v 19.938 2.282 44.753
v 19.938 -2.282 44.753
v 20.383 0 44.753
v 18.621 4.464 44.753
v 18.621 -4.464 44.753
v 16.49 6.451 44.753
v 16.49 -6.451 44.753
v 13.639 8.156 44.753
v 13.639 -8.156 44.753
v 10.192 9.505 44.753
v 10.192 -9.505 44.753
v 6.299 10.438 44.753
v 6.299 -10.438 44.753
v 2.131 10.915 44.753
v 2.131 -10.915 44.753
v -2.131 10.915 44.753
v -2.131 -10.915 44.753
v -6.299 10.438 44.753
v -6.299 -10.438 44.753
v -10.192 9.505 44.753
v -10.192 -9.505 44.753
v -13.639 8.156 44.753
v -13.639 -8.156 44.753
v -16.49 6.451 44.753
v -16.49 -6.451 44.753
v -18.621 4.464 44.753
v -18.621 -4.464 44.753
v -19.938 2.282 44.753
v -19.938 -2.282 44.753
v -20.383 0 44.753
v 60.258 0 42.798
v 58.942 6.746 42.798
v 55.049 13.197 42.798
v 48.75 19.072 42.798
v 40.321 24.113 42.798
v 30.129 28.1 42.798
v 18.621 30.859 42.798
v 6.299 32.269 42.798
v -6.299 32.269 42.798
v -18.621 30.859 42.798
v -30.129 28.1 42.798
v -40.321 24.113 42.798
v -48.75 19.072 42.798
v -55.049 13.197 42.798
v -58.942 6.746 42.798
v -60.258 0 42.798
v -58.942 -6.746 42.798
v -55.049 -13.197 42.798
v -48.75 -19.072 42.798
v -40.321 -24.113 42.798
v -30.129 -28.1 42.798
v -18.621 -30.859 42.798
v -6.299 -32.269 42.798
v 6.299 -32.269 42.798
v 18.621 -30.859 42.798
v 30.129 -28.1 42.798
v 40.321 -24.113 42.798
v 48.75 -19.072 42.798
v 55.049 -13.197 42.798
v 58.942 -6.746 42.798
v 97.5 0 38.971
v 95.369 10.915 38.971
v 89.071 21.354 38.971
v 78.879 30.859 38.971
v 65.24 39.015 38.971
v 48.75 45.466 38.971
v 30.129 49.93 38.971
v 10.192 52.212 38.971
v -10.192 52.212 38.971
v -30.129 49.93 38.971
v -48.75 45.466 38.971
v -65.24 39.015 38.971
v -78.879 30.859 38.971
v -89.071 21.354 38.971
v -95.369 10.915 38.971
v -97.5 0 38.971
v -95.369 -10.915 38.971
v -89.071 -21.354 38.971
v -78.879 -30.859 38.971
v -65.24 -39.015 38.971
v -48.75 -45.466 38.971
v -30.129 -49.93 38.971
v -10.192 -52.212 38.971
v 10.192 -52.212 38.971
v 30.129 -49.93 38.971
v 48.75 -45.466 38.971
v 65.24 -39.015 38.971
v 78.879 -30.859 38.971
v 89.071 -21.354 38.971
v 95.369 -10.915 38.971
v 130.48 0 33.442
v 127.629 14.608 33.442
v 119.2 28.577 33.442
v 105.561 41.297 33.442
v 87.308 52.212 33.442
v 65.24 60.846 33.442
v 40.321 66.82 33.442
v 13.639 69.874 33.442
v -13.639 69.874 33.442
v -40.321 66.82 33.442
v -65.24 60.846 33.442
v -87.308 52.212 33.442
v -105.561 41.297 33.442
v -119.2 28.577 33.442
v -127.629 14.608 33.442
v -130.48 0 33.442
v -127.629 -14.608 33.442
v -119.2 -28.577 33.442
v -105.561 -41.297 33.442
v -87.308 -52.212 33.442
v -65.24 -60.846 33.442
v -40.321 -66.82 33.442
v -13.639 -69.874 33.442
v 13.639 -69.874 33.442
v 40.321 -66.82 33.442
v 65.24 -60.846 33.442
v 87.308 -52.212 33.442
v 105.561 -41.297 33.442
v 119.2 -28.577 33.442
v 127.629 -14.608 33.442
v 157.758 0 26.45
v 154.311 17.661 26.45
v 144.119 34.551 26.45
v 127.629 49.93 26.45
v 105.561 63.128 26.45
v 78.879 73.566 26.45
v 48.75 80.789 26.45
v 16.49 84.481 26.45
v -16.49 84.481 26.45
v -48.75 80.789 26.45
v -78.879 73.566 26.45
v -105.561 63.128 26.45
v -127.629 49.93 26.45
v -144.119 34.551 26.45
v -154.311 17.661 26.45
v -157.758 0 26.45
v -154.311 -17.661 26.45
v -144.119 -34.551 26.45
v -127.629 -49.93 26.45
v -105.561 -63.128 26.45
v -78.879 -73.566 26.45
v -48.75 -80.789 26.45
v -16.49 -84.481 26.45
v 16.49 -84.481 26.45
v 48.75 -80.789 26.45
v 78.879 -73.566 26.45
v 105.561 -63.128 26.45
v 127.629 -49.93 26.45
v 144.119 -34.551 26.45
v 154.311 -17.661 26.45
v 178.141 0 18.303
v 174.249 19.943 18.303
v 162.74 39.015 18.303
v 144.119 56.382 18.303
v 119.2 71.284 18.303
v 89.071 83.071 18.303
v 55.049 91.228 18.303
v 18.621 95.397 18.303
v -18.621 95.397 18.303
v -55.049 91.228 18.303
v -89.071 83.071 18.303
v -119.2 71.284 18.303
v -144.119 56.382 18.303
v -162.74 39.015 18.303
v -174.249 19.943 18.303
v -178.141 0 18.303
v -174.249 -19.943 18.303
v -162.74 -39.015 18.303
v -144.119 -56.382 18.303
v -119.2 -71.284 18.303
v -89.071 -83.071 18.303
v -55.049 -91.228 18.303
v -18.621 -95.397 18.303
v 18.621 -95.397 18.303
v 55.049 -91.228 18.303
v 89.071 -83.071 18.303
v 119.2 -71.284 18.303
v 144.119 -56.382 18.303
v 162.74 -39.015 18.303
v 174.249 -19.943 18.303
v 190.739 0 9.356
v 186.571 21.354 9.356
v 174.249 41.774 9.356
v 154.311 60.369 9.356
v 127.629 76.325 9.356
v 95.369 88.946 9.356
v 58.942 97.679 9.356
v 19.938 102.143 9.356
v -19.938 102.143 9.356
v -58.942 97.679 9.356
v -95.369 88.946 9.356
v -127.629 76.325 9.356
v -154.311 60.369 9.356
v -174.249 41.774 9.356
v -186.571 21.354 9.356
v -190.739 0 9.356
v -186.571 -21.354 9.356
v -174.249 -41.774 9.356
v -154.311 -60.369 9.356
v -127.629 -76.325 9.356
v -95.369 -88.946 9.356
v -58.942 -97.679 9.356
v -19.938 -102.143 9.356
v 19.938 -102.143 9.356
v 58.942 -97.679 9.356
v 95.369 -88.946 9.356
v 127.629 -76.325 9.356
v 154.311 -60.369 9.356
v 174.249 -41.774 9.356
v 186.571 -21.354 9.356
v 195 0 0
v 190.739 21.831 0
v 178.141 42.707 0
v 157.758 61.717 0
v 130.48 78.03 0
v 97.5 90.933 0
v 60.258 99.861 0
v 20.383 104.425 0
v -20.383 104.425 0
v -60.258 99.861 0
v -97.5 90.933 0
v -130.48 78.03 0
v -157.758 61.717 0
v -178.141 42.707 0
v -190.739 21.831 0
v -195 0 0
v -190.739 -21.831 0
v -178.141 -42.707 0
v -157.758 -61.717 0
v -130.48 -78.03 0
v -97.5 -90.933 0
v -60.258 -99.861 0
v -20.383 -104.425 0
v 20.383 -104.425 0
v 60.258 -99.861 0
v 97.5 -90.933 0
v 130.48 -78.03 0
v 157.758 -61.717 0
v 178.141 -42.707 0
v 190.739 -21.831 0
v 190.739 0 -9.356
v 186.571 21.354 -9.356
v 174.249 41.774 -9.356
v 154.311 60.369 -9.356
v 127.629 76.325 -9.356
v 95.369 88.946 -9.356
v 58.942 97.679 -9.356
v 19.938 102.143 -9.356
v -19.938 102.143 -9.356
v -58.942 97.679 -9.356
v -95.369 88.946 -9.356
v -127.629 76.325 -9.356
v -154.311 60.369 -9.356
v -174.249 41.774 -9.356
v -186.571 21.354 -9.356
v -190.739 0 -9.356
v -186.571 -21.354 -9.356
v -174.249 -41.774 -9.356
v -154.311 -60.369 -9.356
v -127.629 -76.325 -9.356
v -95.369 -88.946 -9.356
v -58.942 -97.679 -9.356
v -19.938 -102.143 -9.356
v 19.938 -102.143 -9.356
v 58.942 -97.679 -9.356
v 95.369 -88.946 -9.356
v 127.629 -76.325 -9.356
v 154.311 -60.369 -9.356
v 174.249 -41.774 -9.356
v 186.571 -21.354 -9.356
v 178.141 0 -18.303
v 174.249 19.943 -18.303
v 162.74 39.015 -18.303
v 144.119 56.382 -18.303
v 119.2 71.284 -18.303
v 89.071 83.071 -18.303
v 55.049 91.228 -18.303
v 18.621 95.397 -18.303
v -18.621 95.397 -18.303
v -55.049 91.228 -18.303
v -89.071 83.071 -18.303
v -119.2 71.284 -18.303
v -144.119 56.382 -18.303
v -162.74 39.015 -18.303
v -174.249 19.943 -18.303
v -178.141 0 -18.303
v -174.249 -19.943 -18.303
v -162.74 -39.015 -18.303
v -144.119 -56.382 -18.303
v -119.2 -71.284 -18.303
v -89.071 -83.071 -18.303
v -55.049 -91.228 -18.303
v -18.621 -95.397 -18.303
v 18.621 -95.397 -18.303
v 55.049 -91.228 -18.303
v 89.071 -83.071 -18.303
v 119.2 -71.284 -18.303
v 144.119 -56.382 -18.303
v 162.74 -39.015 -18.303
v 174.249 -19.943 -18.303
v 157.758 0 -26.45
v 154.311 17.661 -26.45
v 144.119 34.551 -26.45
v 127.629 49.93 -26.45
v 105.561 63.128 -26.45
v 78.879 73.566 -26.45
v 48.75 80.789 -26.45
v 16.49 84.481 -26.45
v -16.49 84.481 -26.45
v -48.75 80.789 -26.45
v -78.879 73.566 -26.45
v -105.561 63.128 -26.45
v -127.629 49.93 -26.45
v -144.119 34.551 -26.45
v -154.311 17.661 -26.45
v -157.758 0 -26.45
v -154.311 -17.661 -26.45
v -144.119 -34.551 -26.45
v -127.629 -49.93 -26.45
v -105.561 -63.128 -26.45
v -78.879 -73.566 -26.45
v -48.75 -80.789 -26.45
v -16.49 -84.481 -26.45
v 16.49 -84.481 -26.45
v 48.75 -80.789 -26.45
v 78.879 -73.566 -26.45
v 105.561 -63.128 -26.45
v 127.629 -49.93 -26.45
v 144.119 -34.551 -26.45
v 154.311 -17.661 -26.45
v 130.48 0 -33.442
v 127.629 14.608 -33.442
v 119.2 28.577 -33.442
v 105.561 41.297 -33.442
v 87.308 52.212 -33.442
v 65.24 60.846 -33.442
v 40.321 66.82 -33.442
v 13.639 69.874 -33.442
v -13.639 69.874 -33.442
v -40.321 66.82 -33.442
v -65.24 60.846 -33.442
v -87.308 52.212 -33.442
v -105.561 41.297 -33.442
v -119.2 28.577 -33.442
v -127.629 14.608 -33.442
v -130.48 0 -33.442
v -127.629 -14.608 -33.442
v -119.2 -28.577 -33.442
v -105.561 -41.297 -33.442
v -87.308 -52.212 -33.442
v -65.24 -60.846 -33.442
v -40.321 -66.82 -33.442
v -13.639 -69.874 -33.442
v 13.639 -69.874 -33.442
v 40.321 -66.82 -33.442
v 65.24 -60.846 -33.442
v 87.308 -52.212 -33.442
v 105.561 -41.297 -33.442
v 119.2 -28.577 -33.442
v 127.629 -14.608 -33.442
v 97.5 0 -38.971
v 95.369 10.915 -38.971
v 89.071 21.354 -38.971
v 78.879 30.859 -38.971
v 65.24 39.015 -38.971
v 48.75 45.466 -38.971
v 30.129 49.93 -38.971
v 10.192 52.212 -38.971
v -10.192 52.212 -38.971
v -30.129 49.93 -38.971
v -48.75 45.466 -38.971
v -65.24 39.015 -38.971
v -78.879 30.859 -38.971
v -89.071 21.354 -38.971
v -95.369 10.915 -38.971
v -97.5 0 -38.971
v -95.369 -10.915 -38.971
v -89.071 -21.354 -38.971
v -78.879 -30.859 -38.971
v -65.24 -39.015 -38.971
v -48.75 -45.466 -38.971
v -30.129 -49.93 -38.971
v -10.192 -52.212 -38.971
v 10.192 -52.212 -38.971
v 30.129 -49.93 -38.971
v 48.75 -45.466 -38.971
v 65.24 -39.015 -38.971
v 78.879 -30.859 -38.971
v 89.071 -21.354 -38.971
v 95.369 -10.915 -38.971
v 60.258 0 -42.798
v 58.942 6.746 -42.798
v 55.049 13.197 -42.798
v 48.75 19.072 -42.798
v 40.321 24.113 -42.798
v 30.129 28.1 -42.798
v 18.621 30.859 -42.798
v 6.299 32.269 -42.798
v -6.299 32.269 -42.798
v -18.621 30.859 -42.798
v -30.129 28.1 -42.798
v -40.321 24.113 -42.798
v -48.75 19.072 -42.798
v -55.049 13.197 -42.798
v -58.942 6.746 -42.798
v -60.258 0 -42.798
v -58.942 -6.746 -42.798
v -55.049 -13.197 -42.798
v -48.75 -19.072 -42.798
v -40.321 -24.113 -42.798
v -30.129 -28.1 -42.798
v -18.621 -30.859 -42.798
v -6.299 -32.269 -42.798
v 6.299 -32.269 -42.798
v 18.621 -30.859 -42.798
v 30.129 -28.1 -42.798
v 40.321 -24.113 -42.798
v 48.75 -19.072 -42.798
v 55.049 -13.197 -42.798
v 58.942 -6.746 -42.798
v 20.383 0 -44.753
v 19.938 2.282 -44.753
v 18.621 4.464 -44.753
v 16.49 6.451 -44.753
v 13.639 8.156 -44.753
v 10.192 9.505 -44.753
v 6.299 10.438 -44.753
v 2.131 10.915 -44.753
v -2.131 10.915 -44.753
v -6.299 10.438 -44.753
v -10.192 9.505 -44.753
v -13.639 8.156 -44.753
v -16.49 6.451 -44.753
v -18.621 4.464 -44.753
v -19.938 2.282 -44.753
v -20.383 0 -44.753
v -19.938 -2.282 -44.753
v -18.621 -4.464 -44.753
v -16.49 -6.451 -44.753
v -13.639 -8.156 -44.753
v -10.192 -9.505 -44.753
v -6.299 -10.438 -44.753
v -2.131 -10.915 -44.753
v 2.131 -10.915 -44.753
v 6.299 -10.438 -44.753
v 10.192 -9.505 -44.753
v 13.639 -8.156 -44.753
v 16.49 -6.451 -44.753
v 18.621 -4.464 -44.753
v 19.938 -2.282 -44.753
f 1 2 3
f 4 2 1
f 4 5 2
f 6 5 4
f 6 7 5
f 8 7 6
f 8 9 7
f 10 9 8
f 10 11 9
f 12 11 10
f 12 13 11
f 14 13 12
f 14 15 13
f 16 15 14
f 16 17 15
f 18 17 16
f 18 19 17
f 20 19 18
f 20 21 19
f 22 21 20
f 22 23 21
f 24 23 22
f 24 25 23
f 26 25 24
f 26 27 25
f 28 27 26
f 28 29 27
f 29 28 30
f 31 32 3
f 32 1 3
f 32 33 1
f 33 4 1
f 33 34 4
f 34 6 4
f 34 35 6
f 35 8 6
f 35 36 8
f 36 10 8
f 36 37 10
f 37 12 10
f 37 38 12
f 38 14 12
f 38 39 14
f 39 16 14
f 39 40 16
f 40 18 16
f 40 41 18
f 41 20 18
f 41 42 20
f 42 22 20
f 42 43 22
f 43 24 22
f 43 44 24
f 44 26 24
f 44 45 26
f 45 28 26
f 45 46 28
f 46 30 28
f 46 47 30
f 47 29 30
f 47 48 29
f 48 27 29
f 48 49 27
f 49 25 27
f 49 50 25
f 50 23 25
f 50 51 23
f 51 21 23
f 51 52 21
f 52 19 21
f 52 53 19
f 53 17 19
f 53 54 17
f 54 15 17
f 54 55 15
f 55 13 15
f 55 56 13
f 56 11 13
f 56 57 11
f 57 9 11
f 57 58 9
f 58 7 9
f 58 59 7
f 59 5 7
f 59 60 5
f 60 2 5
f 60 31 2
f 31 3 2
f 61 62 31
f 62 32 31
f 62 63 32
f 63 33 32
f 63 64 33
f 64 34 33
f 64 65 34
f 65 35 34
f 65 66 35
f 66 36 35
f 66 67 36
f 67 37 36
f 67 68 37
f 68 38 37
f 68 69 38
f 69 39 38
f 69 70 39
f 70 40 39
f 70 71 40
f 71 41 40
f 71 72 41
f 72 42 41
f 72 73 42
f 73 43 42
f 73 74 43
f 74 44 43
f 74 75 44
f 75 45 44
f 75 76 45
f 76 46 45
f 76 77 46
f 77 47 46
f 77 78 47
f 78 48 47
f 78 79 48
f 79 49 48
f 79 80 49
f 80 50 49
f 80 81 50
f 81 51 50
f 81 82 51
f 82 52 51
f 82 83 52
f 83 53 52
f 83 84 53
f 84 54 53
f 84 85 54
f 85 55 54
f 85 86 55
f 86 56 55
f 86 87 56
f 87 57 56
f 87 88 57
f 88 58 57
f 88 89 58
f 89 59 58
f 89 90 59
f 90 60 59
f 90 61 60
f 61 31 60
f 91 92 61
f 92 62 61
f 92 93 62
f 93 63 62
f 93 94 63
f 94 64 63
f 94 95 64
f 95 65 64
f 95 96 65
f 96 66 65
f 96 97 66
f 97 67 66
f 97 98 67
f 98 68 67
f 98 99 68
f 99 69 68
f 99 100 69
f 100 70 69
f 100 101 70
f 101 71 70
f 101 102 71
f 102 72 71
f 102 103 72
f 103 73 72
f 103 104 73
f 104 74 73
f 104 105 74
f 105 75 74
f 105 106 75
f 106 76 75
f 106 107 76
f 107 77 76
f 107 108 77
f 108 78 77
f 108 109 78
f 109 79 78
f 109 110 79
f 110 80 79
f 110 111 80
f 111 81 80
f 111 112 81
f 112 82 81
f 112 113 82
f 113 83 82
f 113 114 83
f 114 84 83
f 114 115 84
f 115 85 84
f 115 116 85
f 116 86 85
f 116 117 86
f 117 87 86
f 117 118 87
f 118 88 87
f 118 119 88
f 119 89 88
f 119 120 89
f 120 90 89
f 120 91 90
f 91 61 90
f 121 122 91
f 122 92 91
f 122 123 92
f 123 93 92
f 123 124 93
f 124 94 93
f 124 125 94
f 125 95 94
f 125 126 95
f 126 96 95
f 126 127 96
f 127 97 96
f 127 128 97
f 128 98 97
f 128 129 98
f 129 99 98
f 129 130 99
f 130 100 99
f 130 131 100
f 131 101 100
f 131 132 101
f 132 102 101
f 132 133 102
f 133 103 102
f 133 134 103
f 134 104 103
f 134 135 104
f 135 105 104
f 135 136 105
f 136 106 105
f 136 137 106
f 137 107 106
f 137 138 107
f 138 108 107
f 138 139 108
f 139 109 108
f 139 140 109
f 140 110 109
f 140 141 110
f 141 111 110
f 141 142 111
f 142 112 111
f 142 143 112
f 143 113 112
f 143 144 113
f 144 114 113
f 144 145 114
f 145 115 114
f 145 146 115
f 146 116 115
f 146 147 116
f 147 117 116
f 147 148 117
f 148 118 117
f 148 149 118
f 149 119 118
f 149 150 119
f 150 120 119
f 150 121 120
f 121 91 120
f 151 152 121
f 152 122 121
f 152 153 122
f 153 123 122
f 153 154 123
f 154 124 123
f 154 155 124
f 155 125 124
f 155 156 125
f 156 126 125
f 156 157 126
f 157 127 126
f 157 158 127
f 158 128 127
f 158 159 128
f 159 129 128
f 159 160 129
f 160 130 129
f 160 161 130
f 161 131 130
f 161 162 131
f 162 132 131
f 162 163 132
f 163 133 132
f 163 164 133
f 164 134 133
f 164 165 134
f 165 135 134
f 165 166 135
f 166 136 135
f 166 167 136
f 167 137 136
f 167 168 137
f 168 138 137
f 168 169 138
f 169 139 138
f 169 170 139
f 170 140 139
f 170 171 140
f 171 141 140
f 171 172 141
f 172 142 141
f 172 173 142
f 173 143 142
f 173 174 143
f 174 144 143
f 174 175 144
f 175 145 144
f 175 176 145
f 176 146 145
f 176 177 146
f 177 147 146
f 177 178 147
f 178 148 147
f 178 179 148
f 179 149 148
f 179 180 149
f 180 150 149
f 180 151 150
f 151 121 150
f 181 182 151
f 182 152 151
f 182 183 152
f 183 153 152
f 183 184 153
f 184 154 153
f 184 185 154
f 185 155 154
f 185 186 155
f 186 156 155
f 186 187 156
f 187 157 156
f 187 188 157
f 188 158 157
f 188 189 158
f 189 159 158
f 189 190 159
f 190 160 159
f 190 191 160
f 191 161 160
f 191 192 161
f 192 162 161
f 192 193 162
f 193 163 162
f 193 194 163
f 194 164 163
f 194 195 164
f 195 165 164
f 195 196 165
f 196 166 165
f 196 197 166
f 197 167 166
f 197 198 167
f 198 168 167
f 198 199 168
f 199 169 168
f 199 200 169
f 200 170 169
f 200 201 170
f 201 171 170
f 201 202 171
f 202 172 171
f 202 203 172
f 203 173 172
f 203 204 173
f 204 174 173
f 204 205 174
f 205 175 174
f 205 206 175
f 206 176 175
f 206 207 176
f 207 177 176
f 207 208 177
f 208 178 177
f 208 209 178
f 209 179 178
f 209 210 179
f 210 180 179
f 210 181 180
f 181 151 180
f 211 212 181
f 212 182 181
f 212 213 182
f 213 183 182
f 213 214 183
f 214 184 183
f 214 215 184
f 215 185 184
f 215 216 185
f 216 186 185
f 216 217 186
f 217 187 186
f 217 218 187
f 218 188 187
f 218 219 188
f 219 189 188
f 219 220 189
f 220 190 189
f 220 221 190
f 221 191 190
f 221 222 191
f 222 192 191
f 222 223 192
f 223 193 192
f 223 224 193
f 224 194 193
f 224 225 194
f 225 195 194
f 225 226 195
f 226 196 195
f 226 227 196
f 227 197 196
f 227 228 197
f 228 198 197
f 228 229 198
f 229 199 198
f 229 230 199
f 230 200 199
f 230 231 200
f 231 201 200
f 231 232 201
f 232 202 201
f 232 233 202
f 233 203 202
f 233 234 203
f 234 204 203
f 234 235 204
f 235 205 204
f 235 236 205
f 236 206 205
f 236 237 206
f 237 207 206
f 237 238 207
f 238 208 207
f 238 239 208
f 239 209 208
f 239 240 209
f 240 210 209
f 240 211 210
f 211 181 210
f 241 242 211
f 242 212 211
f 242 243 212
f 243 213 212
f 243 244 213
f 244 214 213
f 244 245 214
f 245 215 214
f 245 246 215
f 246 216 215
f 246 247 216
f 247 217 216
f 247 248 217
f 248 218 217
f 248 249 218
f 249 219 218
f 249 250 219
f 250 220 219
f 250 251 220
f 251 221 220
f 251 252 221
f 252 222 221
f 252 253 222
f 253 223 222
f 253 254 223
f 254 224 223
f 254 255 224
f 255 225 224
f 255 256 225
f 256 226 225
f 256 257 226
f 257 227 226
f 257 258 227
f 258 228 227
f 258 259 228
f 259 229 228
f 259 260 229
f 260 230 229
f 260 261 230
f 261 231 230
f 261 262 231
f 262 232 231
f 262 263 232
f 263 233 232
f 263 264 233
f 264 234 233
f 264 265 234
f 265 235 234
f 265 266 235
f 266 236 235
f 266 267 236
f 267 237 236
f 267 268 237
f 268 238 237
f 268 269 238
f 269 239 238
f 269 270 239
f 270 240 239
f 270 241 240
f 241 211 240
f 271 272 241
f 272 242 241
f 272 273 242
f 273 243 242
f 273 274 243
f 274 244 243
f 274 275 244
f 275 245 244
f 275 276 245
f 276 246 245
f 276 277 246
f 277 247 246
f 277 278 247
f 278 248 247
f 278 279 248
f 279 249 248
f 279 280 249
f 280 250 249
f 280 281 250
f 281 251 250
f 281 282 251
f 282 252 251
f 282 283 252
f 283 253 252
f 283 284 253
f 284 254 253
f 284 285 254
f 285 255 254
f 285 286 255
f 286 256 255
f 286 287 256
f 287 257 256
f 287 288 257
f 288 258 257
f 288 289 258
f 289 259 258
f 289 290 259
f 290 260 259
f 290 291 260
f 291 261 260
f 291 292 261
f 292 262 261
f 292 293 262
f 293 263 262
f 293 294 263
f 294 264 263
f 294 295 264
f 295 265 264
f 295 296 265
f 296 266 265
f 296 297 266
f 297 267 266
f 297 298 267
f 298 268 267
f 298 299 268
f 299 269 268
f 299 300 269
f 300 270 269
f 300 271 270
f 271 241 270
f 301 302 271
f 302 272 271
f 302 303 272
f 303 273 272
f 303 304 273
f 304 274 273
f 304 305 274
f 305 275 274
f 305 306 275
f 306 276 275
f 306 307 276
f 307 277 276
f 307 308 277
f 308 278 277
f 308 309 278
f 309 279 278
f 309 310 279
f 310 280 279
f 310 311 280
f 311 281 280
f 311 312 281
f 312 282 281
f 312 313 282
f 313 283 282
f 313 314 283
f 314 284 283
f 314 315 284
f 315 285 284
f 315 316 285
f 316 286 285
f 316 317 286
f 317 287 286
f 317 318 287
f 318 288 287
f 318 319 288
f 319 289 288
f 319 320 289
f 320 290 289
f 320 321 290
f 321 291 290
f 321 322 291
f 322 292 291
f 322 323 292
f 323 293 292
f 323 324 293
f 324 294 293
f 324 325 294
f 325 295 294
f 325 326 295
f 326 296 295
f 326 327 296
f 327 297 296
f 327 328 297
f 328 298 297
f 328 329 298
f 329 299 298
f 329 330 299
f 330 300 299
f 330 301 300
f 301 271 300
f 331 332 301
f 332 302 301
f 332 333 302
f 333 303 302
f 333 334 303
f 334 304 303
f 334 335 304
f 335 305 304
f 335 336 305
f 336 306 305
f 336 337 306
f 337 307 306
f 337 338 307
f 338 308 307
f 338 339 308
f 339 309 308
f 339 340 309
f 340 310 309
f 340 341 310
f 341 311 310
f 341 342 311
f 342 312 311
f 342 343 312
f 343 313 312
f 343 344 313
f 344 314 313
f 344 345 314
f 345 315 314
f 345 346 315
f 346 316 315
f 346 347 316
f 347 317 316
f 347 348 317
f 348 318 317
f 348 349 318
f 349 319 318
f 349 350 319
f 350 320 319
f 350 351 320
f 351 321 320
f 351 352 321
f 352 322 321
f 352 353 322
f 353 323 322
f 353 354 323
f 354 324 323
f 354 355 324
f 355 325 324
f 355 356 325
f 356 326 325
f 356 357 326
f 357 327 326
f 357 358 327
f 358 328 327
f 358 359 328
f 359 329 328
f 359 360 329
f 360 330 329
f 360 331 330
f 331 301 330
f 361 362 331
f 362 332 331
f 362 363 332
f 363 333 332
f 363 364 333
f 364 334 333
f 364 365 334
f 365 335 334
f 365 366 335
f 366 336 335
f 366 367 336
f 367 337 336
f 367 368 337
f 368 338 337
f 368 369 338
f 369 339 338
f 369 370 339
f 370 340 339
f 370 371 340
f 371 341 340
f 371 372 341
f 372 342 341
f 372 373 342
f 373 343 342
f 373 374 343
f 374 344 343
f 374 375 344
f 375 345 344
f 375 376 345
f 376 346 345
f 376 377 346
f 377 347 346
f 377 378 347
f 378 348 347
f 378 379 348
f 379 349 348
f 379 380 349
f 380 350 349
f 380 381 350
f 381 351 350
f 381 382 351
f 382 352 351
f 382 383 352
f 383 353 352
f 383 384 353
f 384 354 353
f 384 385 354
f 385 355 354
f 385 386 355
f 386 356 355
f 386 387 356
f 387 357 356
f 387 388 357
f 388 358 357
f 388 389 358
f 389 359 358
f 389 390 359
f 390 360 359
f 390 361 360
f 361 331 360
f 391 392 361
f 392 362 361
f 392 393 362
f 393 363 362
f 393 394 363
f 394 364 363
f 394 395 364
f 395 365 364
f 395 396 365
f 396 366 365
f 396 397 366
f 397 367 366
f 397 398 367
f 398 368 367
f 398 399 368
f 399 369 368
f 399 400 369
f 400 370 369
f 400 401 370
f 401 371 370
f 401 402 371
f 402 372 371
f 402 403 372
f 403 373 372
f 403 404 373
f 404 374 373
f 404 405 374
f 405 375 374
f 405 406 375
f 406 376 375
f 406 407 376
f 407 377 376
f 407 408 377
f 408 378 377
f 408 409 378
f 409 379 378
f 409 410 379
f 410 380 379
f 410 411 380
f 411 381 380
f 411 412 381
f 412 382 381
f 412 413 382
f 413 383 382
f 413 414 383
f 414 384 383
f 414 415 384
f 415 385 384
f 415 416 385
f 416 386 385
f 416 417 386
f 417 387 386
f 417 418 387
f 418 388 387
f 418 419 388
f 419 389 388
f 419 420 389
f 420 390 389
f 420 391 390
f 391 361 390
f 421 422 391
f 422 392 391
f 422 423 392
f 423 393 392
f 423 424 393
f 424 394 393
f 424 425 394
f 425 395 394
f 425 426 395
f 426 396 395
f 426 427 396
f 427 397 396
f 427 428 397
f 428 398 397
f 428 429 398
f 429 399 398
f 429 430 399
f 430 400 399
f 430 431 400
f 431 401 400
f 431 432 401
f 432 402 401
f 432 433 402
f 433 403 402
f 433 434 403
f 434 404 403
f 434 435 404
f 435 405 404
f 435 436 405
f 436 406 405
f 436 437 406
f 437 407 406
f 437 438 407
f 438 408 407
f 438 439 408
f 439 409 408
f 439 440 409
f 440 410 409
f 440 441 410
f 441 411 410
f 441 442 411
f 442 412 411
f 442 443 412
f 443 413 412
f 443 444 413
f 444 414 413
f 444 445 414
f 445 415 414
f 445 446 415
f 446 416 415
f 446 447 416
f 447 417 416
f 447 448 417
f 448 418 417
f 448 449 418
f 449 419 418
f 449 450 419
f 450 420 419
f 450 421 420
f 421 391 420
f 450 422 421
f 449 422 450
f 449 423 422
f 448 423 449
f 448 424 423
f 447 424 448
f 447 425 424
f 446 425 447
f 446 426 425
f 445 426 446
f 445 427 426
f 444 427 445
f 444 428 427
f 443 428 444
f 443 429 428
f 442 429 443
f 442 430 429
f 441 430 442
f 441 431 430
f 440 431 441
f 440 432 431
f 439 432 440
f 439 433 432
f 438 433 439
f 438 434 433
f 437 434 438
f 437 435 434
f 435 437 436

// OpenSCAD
// Generated by SolidPython 1.0.1 on 2020-07-29 00:46:50


scale(v = [13, 7, 3]) {
	sphere(r = 15);
}
/***********************************************
*********      SolidPython code:      **********
************************************************
 
# import packages: SolidPython
from solid import *
from solid.utils import *
from itertools import chain, combinations, permutations


class Resize:

    def __init__(self, scad_file):
        self.scad_file = scad_file
        #self.scad_file = import_scad(scad_file)
        # cone/cylinder param:
        self.r1 = 0
        self.r2 = 0
        self.h = 0
        # rectangular prism param:
        self.w = 0
        self.l = 0
        # ellipse param:
        self.r = 0

    # import OpenScad code (file name corresponds to shape)


    # classify shape + parameters
    def assign(self, param1, param2, param3):
        if self.scad_file == 'cone.scad':
            self.r1 = param1
            self.r2 = param2
            self.h = param3
        elif self.scad_file == 'cylinder.scad':
            self.r1 = param1
            self.r2 = param2
            self.h = param3
        elif self.scad_file == 'rectangularPrism.scad':
            self.h = param1
            self.l = param2
            self.w = param3
        else:
            self.r = param1
            self.h = param2

    # resize parameters
    def iterate(self):
        x = range(3, 20, 2)
        i = 1
        if self.scad_file == 'cone.scad':
            tempList = list(permutations(x, 2))
            for temp in tempList:
                param1 = temp[0]
                param2 = temp[1]
                filepath = 'produced_scad_files/' + 'cone' + str(param1) + '_' + str(param2) + '_' + '.scad'
                scad_render_to_file(cylinder(h=param1, r1=param2, r2=0), filepath)

        elif self.scad_file == 'cylinder.scad':
            tempList = list(permutations(x, 3))
            for temp in tempList:
                param1 = temp[0]
                param2 = temp[1]
                filepath = 'produced_scad_files/' + 'cylinder' + str(param1) + '_' + str(param2) + '_' + '.scad'
                scad_render_to_file(cylinder(h=param1, r1=param2, r2=param2), filepath)

        elif self.scad_file == 'rectangularPrism.scad':
            tempList = list(permutations(x, 3))
            for temp in tempList:
                param1 = temp[0]
                param2 = temp[1]
                param3 = temp[2]
                filepath = 'produced_scad_files/' + 'rectangularPrism' + str(param1) + '_' + str(param2) + '_' + str(
                    param3) + '.scad'
                scad_render_to_file(cube(size=(param1, param2, param3)), filepath)

        elif self.scad_file == 'ellipse.scad':
            tempList = list(permutations(x, 4))
            for temp in tempList:
                param1 = temp[0]
                param2 = temp[1]
                param3 = temp[2]
                param4 = temp[3]
                filepath = 'produced_scad_files/' + 'ellipse' + str(param1) + '_' + str(param2) + '_' + str(param3) + '_' + str(param4) + '.scad'
                scad_render_to_file(scale([param1, param2, param3])(sphere(r=param4)), filepath)

    def render_to_scadfile(self):
        scad_render_to_file(scad, 'example.scad') 
 
************************************************/
